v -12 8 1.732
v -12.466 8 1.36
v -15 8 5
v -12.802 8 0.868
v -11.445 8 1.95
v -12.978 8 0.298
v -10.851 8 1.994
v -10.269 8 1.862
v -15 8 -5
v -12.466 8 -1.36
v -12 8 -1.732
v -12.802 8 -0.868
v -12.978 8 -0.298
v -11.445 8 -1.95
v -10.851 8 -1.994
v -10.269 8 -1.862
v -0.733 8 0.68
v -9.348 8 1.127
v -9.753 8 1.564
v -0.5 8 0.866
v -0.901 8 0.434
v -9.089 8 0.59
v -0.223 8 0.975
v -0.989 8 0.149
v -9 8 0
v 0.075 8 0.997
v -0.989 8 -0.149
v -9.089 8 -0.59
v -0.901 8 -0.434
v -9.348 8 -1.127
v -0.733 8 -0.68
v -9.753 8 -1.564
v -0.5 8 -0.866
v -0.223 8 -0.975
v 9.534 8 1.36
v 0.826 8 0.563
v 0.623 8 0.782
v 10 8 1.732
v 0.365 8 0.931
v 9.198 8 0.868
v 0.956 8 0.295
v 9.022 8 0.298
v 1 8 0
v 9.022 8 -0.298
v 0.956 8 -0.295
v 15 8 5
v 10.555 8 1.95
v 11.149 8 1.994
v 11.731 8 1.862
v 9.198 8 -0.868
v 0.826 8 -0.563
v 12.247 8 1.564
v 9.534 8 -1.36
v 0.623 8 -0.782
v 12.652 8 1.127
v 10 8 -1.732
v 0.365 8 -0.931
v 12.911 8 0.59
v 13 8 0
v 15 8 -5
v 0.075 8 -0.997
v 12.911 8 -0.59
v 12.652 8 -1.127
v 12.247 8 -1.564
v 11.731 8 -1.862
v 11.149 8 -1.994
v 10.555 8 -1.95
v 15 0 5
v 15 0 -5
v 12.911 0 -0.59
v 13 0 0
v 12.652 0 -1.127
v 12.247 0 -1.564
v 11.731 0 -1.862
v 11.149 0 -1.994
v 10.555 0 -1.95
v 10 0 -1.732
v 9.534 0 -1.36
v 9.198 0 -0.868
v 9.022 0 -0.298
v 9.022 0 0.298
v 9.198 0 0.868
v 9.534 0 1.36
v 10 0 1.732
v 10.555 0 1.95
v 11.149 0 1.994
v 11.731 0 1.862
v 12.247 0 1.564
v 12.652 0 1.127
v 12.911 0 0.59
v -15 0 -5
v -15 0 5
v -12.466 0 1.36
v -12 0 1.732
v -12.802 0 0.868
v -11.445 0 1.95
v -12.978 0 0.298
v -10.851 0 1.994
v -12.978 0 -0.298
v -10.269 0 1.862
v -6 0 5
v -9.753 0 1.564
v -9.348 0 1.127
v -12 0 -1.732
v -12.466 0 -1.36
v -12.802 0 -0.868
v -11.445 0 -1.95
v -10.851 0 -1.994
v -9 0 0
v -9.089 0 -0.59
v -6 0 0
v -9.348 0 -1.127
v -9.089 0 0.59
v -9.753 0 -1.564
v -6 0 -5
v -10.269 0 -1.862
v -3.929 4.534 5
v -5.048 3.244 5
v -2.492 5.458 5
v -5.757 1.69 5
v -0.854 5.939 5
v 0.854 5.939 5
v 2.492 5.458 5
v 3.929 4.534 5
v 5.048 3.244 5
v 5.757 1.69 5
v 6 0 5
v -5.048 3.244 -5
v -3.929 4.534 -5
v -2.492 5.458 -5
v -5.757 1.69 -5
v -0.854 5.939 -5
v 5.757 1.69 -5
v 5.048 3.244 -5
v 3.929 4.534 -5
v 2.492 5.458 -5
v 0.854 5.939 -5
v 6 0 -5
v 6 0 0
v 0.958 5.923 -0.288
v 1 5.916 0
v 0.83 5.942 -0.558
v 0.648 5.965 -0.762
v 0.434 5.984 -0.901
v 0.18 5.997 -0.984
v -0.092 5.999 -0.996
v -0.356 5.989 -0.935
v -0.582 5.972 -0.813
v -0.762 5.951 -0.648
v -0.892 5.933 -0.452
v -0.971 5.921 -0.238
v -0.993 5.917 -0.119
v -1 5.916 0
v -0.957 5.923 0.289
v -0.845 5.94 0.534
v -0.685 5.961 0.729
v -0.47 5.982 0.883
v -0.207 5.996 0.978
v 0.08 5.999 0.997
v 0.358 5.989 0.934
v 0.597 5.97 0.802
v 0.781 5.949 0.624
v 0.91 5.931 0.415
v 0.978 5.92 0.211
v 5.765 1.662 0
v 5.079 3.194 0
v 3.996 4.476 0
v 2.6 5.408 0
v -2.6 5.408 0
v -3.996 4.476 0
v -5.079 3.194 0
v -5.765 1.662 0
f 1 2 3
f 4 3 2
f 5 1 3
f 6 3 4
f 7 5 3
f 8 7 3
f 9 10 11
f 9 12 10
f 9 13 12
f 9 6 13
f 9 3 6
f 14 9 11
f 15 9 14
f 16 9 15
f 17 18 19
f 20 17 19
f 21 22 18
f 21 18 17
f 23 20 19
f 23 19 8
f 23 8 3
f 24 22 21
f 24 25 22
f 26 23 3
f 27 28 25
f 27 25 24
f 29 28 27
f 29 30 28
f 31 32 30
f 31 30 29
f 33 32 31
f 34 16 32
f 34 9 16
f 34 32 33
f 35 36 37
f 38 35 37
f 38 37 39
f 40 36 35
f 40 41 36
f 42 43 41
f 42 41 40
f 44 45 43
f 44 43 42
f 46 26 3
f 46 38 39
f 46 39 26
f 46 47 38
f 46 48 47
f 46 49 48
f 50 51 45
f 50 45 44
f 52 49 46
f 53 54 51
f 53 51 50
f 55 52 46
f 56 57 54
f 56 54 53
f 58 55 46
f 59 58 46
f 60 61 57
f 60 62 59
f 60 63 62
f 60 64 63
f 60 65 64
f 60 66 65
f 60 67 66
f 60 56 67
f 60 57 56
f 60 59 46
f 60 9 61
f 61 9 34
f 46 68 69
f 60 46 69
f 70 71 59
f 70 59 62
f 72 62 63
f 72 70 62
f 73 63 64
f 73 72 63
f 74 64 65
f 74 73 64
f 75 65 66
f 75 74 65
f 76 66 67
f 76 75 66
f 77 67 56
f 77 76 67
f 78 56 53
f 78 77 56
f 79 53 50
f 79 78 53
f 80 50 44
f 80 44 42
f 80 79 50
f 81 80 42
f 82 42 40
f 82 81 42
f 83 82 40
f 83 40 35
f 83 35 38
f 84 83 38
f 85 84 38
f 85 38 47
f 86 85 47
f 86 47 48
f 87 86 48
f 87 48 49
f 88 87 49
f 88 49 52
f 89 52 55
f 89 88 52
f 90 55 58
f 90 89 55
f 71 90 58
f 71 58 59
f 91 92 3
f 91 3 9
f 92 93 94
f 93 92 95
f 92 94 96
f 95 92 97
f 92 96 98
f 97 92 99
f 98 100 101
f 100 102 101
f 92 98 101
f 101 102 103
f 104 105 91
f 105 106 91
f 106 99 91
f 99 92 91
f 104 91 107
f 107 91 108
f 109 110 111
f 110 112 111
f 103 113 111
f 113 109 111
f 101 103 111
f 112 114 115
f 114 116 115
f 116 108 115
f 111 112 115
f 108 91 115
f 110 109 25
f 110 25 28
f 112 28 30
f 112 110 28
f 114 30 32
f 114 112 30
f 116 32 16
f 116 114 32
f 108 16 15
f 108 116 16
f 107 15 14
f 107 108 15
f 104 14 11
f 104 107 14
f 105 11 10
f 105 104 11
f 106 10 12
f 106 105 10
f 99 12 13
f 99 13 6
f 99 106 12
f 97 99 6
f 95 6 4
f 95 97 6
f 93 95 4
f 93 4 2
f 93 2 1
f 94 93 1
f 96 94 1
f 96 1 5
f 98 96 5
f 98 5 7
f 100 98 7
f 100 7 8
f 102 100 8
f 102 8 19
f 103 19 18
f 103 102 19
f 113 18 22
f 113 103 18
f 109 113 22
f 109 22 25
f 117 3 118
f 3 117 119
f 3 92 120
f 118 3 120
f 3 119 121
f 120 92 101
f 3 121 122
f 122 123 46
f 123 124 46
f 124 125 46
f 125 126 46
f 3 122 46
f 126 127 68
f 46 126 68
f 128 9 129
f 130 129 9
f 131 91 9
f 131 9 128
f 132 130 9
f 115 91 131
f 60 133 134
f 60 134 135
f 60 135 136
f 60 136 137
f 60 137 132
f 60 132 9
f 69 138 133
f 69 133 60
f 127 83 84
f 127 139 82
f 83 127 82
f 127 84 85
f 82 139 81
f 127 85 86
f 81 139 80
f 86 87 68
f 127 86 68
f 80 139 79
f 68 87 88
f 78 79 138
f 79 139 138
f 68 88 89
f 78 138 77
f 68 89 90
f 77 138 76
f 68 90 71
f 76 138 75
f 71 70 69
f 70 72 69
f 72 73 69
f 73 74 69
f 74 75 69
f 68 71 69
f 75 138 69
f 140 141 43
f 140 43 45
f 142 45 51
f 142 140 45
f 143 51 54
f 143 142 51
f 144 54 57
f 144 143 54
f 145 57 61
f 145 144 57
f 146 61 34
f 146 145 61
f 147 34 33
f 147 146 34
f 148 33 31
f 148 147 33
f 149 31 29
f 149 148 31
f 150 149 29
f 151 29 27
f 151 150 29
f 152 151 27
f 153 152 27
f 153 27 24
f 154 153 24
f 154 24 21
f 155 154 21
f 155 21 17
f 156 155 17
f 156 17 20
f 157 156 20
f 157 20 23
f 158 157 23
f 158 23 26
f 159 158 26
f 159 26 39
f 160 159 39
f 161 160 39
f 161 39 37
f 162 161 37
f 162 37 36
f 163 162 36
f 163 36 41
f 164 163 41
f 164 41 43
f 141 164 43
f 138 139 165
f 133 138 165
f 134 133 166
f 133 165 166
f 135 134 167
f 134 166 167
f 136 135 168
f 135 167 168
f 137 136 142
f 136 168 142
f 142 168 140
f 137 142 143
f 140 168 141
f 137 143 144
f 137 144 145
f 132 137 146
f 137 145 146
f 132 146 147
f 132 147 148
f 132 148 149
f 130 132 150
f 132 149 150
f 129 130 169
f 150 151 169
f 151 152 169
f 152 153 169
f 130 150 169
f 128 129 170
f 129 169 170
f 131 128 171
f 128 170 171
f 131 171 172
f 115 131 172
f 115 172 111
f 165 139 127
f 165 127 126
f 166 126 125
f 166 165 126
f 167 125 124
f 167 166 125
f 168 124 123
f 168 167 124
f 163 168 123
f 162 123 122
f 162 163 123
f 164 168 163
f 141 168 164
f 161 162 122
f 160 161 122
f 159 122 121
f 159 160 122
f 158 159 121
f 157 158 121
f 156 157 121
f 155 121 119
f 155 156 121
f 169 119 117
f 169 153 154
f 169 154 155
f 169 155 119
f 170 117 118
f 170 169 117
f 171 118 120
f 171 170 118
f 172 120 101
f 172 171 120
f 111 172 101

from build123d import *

# Parameters (mm, degrees)
SKETCH1_W               = 30
SKETCH1_H               = 10
SKETCH1_R               = 2
SKETCH1_R_2             = 1
BOSS_EXTRUDE1_DEPTH     = 8
SKETCH2_R               = 6
CUT_EXTRUDE1_DEPTH      = 6
CUT_EXTRUDE1_DEPTH_BACK = 6


with BuildPart() as part:
    # Sketch1 → Boss-Extrude1 (new body)
    with BuildSketch(Plane(origin=(0, 0, 0), x_dir=(1, 0, 0), z_dir=(0, 1, 0))):
        Rectangle(SKETCH1_W, SKETCH1_H)
        with Locations((-11, 0)):
            Circle(SKETCH1_R, mode=Mode.SUBTRACT)
        with Locations((11, 0)):
            Circle(SKETCH1_R, mode=Mode.SUBTRACT)
        Circle(SKETCH1_R_2, mode=Mode.SUBTRACT)
    extrude(amount=BOSS_EXTRUDE1_DEPTH)

    # Sketch2 → Cut-Extrude1 (cut, two sides)
    with BuildSketch(Plane.XY) as cut_extrude1_sk:
        Circle(SKETCH2_R)
    extrude(amount=CUT_EXTRUDE1_DEPTH, mode=Mode.SUBTRACT)
    extrude(cut_extrude1_sk.sketch, amount=-CUT_EXTRUDE1_DEPTH_BACK, mode=Mode.SUBTRACT)


solid = part.part
